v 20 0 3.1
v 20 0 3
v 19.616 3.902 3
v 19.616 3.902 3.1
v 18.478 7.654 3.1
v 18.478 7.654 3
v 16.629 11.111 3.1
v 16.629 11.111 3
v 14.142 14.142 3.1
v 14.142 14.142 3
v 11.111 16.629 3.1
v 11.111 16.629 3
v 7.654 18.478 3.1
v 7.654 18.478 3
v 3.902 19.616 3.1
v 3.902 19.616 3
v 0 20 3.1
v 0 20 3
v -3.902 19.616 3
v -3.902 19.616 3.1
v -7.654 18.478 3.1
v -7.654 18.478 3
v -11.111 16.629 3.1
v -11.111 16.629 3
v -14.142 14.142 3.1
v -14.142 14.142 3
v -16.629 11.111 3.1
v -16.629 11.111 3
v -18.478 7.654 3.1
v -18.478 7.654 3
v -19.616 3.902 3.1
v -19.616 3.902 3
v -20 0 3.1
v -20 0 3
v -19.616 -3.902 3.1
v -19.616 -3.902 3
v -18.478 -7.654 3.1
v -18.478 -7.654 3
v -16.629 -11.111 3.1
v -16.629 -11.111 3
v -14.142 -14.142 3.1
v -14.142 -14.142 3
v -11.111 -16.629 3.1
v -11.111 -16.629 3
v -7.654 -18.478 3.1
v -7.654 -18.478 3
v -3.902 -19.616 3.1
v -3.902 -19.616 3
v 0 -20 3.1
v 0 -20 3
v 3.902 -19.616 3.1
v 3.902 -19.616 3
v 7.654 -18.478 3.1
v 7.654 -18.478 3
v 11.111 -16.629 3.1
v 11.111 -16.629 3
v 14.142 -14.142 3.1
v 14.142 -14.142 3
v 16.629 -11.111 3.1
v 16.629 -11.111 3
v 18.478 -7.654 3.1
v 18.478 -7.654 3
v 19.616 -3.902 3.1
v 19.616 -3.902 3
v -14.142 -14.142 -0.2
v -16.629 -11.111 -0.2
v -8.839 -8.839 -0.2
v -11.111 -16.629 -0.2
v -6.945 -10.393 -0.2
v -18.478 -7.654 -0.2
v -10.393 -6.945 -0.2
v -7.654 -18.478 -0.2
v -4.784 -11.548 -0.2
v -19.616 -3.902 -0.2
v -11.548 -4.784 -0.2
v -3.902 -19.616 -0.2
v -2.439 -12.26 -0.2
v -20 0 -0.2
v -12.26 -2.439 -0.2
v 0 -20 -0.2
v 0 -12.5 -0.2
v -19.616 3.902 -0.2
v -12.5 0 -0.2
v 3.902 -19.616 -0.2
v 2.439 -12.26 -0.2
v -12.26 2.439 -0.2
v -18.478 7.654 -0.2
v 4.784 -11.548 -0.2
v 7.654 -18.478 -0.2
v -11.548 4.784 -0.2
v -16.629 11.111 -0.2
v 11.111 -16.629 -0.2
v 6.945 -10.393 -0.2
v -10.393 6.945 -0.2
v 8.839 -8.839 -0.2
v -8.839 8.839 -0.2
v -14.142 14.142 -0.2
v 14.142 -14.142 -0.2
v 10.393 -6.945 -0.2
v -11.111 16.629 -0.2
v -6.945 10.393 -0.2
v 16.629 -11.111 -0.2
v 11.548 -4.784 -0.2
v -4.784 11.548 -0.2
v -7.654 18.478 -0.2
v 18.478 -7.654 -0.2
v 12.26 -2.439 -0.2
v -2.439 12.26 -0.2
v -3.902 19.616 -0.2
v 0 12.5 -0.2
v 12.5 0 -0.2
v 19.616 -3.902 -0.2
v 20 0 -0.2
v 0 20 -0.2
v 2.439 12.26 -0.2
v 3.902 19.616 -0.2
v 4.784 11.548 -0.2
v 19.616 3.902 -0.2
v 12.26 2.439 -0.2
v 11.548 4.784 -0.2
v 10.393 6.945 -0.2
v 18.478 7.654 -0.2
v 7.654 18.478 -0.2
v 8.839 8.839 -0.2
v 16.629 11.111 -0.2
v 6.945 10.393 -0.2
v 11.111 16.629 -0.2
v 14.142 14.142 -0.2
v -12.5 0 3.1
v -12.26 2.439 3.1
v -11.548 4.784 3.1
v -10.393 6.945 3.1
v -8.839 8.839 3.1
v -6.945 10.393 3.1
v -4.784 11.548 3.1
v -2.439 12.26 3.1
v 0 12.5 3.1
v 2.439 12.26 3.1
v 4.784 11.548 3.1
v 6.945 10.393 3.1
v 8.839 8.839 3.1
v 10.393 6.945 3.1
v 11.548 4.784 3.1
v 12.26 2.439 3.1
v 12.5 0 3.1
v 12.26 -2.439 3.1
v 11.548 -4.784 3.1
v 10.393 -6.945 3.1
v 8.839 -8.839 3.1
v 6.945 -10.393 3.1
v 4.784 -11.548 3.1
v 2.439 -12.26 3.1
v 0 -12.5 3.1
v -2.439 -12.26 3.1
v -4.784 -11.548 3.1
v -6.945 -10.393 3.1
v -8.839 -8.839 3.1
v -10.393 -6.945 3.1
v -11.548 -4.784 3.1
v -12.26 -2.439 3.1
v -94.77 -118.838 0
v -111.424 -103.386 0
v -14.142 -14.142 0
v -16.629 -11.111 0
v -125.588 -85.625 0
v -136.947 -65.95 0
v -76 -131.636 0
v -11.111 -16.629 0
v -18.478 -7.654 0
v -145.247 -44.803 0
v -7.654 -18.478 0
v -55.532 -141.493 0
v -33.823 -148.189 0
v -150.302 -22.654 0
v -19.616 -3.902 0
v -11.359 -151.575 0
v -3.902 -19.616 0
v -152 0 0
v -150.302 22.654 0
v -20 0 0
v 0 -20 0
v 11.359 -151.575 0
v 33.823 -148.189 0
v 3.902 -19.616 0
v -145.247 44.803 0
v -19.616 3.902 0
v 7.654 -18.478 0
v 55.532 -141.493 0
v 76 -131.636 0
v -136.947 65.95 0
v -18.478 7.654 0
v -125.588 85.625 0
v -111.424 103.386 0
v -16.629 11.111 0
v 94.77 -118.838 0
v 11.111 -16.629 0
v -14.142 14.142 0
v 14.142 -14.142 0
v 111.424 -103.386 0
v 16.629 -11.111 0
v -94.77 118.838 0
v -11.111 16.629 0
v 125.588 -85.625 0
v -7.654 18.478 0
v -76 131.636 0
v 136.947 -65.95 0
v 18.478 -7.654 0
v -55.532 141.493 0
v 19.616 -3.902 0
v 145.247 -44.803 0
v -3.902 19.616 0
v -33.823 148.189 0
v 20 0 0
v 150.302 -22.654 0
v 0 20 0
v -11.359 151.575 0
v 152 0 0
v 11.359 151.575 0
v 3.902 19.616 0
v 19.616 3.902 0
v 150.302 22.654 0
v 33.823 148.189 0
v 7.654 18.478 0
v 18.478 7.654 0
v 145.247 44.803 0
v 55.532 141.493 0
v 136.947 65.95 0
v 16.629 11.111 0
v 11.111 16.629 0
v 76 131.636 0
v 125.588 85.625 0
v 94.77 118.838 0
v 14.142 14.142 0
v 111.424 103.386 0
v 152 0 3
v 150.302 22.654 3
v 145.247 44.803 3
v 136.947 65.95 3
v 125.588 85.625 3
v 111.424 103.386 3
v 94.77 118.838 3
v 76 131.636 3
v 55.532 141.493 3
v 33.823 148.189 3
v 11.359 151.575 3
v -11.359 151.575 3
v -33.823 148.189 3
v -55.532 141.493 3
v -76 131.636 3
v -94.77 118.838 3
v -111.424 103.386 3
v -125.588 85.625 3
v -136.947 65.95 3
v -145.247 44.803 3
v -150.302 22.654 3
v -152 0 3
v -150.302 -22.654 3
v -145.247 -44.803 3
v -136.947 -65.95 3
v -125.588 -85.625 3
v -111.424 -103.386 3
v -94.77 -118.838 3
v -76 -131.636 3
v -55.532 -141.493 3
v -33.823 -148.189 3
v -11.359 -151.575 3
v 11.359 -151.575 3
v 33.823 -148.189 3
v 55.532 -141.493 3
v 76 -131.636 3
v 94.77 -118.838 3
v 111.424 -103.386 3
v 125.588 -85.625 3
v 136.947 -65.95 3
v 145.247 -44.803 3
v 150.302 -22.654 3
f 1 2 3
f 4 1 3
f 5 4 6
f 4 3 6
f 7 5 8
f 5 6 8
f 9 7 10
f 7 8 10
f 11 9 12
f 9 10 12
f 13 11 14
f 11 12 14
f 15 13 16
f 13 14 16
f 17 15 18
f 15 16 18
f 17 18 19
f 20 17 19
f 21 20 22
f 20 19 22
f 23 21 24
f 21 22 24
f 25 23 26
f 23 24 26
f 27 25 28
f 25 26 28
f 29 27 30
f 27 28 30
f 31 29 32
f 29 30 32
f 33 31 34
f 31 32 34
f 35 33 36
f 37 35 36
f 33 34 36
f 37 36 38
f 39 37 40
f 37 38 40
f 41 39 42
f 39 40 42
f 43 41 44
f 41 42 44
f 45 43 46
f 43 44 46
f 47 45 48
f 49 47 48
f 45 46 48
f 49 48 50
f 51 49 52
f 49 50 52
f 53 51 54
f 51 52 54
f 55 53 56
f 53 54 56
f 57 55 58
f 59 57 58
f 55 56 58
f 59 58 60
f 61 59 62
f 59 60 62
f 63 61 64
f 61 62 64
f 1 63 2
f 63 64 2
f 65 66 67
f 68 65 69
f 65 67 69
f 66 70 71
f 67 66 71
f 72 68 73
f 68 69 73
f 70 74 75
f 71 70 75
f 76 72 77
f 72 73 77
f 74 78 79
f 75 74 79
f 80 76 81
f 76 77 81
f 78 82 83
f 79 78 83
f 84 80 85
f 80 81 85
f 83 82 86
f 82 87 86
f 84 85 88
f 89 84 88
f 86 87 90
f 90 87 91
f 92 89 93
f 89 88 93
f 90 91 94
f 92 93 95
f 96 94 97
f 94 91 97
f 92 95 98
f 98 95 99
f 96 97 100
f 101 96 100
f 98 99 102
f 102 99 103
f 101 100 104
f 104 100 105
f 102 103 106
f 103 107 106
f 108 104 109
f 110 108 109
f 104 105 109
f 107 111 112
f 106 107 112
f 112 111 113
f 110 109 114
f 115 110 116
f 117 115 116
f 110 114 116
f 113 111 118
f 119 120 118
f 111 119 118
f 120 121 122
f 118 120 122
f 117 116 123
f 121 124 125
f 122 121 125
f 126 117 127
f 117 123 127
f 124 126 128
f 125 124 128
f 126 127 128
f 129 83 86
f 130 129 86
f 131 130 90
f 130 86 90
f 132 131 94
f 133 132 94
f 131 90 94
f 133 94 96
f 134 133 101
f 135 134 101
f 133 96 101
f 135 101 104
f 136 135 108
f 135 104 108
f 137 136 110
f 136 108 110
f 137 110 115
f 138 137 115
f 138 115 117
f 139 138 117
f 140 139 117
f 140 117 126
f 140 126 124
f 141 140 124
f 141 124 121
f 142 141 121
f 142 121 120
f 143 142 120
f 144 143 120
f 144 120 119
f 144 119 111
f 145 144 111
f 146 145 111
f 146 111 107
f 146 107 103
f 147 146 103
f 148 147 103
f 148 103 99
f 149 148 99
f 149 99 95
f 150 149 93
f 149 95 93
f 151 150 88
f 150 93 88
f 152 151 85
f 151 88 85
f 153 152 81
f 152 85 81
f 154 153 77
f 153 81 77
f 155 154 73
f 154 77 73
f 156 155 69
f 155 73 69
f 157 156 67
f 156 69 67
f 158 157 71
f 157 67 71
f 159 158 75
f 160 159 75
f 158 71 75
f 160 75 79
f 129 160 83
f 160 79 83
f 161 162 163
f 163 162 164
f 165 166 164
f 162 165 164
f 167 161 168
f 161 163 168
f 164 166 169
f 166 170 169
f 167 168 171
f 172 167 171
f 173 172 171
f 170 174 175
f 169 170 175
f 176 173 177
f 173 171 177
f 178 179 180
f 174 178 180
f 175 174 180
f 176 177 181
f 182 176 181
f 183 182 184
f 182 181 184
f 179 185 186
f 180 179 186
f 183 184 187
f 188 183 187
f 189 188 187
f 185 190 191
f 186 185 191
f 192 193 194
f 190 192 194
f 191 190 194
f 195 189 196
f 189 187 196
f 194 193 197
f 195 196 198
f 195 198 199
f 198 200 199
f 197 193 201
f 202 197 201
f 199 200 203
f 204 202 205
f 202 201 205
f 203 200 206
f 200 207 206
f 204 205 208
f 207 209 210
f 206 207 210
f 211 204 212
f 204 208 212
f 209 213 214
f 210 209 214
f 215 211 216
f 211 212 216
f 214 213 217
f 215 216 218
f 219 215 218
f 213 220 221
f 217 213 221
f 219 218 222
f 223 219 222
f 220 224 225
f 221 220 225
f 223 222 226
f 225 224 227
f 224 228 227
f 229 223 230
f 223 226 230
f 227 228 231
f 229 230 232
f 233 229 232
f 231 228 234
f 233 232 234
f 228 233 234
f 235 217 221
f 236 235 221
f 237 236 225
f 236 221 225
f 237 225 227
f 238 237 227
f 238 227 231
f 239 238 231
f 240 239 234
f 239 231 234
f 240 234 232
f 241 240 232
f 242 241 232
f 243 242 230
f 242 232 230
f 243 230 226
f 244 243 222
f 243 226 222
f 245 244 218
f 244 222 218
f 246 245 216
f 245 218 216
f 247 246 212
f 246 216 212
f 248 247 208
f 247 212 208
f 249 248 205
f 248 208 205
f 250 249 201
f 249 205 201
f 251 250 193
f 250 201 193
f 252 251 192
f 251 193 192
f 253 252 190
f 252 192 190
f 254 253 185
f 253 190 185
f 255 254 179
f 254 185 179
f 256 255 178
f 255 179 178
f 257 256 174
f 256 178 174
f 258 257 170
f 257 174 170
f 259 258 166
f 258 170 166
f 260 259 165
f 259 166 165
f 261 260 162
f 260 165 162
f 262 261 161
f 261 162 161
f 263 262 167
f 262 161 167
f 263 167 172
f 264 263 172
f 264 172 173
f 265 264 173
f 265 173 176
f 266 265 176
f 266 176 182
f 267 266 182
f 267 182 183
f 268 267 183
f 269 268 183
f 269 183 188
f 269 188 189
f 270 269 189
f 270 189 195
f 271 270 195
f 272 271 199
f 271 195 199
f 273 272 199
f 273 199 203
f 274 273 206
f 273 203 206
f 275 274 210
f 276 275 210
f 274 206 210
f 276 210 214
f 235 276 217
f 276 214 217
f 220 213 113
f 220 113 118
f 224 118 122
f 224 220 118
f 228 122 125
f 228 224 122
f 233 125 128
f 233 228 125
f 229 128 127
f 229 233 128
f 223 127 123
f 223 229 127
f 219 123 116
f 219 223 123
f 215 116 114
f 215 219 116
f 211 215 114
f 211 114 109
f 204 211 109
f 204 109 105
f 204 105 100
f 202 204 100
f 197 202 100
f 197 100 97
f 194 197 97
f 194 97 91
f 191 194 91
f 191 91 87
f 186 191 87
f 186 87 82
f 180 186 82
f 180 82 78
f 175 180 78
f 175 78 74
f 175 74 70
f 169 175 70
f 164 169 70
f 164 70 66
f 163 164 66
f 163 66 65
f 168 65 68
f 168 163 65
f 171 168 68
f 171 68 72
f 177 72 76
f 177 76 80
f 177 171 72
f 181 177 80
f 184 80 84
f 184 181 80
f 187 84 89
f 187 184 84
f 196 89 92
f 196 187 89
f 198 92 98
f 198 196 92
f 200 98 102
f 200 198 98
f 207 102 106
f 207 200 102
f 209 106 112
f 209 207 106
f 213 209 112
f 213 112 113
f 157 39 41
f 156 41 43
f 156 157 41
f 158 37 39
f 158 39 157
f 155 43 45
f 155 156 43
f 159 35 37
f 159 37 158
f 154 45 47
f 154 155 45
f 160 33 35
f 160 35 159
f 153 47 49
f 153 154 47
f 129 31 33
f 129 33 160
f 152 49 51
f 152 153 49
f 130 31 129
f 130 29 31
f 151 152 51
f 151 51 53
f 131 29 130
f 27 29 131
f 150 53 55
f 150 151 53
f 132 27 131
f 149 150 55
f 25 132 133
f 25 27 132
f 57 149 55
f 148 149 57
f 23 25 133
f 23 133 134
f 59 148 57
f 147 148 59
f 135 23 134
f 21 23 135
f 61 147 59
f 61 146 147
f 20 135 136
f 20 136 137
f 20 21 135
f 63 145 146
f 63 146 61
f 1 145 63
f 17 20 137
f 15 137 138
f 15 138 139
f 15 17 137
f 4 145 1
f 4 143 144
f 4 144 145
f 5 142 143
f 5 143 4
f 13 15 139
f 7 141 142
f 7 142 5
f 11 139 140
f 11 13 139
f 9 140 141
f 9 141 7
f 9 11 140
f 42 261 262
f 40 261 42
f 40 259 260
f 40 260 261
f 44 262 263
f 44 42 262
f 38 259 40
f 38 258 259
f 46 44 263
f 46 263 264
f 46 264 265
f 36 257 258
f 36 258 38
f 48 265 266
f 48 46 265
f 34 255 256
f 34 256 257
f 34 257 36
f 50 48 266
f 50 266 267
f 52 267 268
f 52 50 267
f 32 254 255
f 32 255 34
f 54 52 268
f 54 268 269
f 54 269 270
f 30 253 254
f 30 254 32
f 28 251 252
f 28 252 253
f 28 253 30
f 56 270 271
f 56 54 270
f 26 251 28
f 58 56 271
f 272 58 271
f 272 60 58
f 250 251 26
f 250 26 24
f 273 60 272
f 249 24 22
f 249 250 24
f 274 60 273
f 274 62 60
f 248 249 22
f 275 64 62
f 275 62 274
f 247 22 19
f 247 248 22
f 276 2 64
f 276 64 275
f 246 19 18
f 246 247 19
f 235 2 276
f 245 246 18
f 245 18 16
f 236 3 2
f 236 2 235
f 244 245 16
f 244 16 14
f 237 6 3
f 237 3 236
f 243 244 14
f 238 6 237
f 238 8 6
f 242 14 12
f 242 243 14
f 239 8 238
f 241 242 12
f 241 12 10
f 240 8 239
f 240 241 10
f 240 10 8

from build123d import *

# Parameters (mm, degrees)
SKETCH1_R                = 152
BOSS_EXTRUDE1_DEPTH      = 3
SKETCH2_R                = 12.5
CUT_EXTRUDE1_DEPTH       = 3
SKETCH3_R                = 20
BOSS_EXTRUDE2_DEPTH      = 0.1
BOSS_EXTRUDE2_DEPTH_BACK = 3.2
SKETCH4_R                = 12.5
CUT_EXTRUDE2_DEPTH       = 50.1


with BuildPart() as part:
    # Sketch1 → Boss-Extrude1 (new body)
    with BuildSketch(Plane.XY):
        Circle(SKETCH1_R)
    extrude(amount=BOSS_EXTRUDE1_DEPTH)

    # Sketch2 → Cut-Extrude1 (cut)
    with BuildSketch(Plane.XY.offset(3)):
        Circle(SKETCH2_R)
    extrude(amount=-CUT_EXTRUDE1_DEPTH, mode=Mode.SUBTRACT)

    # Sketch3 → Boss-Extrude2 (add, two sides)
    with BuildSketch(Plane.XY.offset(3)) as boss_extrude2_sk:
        Circle(SKETCH3_R)
    extrude(amount=BOSS_EXTRUDE2_DEPTH)
    extrude(boss_extrude2_sk.sketch, amount=-BOSS_EXTRUDE2_DEPTH_BACK)

    # Sketch4 → Cut-Extrude2 (cut)
    with BuildSketch(Plane(origin=(0, 0, -0.2), x_dir=(-1, 0, 0), z_dir=(0, 0, -1))):
        Circle(SKETCH4_R)
    extrude(amount=-CUT_EXTRUDE2_DEPTH, mode=Mode.SUBTRACT)


solid = part.part
